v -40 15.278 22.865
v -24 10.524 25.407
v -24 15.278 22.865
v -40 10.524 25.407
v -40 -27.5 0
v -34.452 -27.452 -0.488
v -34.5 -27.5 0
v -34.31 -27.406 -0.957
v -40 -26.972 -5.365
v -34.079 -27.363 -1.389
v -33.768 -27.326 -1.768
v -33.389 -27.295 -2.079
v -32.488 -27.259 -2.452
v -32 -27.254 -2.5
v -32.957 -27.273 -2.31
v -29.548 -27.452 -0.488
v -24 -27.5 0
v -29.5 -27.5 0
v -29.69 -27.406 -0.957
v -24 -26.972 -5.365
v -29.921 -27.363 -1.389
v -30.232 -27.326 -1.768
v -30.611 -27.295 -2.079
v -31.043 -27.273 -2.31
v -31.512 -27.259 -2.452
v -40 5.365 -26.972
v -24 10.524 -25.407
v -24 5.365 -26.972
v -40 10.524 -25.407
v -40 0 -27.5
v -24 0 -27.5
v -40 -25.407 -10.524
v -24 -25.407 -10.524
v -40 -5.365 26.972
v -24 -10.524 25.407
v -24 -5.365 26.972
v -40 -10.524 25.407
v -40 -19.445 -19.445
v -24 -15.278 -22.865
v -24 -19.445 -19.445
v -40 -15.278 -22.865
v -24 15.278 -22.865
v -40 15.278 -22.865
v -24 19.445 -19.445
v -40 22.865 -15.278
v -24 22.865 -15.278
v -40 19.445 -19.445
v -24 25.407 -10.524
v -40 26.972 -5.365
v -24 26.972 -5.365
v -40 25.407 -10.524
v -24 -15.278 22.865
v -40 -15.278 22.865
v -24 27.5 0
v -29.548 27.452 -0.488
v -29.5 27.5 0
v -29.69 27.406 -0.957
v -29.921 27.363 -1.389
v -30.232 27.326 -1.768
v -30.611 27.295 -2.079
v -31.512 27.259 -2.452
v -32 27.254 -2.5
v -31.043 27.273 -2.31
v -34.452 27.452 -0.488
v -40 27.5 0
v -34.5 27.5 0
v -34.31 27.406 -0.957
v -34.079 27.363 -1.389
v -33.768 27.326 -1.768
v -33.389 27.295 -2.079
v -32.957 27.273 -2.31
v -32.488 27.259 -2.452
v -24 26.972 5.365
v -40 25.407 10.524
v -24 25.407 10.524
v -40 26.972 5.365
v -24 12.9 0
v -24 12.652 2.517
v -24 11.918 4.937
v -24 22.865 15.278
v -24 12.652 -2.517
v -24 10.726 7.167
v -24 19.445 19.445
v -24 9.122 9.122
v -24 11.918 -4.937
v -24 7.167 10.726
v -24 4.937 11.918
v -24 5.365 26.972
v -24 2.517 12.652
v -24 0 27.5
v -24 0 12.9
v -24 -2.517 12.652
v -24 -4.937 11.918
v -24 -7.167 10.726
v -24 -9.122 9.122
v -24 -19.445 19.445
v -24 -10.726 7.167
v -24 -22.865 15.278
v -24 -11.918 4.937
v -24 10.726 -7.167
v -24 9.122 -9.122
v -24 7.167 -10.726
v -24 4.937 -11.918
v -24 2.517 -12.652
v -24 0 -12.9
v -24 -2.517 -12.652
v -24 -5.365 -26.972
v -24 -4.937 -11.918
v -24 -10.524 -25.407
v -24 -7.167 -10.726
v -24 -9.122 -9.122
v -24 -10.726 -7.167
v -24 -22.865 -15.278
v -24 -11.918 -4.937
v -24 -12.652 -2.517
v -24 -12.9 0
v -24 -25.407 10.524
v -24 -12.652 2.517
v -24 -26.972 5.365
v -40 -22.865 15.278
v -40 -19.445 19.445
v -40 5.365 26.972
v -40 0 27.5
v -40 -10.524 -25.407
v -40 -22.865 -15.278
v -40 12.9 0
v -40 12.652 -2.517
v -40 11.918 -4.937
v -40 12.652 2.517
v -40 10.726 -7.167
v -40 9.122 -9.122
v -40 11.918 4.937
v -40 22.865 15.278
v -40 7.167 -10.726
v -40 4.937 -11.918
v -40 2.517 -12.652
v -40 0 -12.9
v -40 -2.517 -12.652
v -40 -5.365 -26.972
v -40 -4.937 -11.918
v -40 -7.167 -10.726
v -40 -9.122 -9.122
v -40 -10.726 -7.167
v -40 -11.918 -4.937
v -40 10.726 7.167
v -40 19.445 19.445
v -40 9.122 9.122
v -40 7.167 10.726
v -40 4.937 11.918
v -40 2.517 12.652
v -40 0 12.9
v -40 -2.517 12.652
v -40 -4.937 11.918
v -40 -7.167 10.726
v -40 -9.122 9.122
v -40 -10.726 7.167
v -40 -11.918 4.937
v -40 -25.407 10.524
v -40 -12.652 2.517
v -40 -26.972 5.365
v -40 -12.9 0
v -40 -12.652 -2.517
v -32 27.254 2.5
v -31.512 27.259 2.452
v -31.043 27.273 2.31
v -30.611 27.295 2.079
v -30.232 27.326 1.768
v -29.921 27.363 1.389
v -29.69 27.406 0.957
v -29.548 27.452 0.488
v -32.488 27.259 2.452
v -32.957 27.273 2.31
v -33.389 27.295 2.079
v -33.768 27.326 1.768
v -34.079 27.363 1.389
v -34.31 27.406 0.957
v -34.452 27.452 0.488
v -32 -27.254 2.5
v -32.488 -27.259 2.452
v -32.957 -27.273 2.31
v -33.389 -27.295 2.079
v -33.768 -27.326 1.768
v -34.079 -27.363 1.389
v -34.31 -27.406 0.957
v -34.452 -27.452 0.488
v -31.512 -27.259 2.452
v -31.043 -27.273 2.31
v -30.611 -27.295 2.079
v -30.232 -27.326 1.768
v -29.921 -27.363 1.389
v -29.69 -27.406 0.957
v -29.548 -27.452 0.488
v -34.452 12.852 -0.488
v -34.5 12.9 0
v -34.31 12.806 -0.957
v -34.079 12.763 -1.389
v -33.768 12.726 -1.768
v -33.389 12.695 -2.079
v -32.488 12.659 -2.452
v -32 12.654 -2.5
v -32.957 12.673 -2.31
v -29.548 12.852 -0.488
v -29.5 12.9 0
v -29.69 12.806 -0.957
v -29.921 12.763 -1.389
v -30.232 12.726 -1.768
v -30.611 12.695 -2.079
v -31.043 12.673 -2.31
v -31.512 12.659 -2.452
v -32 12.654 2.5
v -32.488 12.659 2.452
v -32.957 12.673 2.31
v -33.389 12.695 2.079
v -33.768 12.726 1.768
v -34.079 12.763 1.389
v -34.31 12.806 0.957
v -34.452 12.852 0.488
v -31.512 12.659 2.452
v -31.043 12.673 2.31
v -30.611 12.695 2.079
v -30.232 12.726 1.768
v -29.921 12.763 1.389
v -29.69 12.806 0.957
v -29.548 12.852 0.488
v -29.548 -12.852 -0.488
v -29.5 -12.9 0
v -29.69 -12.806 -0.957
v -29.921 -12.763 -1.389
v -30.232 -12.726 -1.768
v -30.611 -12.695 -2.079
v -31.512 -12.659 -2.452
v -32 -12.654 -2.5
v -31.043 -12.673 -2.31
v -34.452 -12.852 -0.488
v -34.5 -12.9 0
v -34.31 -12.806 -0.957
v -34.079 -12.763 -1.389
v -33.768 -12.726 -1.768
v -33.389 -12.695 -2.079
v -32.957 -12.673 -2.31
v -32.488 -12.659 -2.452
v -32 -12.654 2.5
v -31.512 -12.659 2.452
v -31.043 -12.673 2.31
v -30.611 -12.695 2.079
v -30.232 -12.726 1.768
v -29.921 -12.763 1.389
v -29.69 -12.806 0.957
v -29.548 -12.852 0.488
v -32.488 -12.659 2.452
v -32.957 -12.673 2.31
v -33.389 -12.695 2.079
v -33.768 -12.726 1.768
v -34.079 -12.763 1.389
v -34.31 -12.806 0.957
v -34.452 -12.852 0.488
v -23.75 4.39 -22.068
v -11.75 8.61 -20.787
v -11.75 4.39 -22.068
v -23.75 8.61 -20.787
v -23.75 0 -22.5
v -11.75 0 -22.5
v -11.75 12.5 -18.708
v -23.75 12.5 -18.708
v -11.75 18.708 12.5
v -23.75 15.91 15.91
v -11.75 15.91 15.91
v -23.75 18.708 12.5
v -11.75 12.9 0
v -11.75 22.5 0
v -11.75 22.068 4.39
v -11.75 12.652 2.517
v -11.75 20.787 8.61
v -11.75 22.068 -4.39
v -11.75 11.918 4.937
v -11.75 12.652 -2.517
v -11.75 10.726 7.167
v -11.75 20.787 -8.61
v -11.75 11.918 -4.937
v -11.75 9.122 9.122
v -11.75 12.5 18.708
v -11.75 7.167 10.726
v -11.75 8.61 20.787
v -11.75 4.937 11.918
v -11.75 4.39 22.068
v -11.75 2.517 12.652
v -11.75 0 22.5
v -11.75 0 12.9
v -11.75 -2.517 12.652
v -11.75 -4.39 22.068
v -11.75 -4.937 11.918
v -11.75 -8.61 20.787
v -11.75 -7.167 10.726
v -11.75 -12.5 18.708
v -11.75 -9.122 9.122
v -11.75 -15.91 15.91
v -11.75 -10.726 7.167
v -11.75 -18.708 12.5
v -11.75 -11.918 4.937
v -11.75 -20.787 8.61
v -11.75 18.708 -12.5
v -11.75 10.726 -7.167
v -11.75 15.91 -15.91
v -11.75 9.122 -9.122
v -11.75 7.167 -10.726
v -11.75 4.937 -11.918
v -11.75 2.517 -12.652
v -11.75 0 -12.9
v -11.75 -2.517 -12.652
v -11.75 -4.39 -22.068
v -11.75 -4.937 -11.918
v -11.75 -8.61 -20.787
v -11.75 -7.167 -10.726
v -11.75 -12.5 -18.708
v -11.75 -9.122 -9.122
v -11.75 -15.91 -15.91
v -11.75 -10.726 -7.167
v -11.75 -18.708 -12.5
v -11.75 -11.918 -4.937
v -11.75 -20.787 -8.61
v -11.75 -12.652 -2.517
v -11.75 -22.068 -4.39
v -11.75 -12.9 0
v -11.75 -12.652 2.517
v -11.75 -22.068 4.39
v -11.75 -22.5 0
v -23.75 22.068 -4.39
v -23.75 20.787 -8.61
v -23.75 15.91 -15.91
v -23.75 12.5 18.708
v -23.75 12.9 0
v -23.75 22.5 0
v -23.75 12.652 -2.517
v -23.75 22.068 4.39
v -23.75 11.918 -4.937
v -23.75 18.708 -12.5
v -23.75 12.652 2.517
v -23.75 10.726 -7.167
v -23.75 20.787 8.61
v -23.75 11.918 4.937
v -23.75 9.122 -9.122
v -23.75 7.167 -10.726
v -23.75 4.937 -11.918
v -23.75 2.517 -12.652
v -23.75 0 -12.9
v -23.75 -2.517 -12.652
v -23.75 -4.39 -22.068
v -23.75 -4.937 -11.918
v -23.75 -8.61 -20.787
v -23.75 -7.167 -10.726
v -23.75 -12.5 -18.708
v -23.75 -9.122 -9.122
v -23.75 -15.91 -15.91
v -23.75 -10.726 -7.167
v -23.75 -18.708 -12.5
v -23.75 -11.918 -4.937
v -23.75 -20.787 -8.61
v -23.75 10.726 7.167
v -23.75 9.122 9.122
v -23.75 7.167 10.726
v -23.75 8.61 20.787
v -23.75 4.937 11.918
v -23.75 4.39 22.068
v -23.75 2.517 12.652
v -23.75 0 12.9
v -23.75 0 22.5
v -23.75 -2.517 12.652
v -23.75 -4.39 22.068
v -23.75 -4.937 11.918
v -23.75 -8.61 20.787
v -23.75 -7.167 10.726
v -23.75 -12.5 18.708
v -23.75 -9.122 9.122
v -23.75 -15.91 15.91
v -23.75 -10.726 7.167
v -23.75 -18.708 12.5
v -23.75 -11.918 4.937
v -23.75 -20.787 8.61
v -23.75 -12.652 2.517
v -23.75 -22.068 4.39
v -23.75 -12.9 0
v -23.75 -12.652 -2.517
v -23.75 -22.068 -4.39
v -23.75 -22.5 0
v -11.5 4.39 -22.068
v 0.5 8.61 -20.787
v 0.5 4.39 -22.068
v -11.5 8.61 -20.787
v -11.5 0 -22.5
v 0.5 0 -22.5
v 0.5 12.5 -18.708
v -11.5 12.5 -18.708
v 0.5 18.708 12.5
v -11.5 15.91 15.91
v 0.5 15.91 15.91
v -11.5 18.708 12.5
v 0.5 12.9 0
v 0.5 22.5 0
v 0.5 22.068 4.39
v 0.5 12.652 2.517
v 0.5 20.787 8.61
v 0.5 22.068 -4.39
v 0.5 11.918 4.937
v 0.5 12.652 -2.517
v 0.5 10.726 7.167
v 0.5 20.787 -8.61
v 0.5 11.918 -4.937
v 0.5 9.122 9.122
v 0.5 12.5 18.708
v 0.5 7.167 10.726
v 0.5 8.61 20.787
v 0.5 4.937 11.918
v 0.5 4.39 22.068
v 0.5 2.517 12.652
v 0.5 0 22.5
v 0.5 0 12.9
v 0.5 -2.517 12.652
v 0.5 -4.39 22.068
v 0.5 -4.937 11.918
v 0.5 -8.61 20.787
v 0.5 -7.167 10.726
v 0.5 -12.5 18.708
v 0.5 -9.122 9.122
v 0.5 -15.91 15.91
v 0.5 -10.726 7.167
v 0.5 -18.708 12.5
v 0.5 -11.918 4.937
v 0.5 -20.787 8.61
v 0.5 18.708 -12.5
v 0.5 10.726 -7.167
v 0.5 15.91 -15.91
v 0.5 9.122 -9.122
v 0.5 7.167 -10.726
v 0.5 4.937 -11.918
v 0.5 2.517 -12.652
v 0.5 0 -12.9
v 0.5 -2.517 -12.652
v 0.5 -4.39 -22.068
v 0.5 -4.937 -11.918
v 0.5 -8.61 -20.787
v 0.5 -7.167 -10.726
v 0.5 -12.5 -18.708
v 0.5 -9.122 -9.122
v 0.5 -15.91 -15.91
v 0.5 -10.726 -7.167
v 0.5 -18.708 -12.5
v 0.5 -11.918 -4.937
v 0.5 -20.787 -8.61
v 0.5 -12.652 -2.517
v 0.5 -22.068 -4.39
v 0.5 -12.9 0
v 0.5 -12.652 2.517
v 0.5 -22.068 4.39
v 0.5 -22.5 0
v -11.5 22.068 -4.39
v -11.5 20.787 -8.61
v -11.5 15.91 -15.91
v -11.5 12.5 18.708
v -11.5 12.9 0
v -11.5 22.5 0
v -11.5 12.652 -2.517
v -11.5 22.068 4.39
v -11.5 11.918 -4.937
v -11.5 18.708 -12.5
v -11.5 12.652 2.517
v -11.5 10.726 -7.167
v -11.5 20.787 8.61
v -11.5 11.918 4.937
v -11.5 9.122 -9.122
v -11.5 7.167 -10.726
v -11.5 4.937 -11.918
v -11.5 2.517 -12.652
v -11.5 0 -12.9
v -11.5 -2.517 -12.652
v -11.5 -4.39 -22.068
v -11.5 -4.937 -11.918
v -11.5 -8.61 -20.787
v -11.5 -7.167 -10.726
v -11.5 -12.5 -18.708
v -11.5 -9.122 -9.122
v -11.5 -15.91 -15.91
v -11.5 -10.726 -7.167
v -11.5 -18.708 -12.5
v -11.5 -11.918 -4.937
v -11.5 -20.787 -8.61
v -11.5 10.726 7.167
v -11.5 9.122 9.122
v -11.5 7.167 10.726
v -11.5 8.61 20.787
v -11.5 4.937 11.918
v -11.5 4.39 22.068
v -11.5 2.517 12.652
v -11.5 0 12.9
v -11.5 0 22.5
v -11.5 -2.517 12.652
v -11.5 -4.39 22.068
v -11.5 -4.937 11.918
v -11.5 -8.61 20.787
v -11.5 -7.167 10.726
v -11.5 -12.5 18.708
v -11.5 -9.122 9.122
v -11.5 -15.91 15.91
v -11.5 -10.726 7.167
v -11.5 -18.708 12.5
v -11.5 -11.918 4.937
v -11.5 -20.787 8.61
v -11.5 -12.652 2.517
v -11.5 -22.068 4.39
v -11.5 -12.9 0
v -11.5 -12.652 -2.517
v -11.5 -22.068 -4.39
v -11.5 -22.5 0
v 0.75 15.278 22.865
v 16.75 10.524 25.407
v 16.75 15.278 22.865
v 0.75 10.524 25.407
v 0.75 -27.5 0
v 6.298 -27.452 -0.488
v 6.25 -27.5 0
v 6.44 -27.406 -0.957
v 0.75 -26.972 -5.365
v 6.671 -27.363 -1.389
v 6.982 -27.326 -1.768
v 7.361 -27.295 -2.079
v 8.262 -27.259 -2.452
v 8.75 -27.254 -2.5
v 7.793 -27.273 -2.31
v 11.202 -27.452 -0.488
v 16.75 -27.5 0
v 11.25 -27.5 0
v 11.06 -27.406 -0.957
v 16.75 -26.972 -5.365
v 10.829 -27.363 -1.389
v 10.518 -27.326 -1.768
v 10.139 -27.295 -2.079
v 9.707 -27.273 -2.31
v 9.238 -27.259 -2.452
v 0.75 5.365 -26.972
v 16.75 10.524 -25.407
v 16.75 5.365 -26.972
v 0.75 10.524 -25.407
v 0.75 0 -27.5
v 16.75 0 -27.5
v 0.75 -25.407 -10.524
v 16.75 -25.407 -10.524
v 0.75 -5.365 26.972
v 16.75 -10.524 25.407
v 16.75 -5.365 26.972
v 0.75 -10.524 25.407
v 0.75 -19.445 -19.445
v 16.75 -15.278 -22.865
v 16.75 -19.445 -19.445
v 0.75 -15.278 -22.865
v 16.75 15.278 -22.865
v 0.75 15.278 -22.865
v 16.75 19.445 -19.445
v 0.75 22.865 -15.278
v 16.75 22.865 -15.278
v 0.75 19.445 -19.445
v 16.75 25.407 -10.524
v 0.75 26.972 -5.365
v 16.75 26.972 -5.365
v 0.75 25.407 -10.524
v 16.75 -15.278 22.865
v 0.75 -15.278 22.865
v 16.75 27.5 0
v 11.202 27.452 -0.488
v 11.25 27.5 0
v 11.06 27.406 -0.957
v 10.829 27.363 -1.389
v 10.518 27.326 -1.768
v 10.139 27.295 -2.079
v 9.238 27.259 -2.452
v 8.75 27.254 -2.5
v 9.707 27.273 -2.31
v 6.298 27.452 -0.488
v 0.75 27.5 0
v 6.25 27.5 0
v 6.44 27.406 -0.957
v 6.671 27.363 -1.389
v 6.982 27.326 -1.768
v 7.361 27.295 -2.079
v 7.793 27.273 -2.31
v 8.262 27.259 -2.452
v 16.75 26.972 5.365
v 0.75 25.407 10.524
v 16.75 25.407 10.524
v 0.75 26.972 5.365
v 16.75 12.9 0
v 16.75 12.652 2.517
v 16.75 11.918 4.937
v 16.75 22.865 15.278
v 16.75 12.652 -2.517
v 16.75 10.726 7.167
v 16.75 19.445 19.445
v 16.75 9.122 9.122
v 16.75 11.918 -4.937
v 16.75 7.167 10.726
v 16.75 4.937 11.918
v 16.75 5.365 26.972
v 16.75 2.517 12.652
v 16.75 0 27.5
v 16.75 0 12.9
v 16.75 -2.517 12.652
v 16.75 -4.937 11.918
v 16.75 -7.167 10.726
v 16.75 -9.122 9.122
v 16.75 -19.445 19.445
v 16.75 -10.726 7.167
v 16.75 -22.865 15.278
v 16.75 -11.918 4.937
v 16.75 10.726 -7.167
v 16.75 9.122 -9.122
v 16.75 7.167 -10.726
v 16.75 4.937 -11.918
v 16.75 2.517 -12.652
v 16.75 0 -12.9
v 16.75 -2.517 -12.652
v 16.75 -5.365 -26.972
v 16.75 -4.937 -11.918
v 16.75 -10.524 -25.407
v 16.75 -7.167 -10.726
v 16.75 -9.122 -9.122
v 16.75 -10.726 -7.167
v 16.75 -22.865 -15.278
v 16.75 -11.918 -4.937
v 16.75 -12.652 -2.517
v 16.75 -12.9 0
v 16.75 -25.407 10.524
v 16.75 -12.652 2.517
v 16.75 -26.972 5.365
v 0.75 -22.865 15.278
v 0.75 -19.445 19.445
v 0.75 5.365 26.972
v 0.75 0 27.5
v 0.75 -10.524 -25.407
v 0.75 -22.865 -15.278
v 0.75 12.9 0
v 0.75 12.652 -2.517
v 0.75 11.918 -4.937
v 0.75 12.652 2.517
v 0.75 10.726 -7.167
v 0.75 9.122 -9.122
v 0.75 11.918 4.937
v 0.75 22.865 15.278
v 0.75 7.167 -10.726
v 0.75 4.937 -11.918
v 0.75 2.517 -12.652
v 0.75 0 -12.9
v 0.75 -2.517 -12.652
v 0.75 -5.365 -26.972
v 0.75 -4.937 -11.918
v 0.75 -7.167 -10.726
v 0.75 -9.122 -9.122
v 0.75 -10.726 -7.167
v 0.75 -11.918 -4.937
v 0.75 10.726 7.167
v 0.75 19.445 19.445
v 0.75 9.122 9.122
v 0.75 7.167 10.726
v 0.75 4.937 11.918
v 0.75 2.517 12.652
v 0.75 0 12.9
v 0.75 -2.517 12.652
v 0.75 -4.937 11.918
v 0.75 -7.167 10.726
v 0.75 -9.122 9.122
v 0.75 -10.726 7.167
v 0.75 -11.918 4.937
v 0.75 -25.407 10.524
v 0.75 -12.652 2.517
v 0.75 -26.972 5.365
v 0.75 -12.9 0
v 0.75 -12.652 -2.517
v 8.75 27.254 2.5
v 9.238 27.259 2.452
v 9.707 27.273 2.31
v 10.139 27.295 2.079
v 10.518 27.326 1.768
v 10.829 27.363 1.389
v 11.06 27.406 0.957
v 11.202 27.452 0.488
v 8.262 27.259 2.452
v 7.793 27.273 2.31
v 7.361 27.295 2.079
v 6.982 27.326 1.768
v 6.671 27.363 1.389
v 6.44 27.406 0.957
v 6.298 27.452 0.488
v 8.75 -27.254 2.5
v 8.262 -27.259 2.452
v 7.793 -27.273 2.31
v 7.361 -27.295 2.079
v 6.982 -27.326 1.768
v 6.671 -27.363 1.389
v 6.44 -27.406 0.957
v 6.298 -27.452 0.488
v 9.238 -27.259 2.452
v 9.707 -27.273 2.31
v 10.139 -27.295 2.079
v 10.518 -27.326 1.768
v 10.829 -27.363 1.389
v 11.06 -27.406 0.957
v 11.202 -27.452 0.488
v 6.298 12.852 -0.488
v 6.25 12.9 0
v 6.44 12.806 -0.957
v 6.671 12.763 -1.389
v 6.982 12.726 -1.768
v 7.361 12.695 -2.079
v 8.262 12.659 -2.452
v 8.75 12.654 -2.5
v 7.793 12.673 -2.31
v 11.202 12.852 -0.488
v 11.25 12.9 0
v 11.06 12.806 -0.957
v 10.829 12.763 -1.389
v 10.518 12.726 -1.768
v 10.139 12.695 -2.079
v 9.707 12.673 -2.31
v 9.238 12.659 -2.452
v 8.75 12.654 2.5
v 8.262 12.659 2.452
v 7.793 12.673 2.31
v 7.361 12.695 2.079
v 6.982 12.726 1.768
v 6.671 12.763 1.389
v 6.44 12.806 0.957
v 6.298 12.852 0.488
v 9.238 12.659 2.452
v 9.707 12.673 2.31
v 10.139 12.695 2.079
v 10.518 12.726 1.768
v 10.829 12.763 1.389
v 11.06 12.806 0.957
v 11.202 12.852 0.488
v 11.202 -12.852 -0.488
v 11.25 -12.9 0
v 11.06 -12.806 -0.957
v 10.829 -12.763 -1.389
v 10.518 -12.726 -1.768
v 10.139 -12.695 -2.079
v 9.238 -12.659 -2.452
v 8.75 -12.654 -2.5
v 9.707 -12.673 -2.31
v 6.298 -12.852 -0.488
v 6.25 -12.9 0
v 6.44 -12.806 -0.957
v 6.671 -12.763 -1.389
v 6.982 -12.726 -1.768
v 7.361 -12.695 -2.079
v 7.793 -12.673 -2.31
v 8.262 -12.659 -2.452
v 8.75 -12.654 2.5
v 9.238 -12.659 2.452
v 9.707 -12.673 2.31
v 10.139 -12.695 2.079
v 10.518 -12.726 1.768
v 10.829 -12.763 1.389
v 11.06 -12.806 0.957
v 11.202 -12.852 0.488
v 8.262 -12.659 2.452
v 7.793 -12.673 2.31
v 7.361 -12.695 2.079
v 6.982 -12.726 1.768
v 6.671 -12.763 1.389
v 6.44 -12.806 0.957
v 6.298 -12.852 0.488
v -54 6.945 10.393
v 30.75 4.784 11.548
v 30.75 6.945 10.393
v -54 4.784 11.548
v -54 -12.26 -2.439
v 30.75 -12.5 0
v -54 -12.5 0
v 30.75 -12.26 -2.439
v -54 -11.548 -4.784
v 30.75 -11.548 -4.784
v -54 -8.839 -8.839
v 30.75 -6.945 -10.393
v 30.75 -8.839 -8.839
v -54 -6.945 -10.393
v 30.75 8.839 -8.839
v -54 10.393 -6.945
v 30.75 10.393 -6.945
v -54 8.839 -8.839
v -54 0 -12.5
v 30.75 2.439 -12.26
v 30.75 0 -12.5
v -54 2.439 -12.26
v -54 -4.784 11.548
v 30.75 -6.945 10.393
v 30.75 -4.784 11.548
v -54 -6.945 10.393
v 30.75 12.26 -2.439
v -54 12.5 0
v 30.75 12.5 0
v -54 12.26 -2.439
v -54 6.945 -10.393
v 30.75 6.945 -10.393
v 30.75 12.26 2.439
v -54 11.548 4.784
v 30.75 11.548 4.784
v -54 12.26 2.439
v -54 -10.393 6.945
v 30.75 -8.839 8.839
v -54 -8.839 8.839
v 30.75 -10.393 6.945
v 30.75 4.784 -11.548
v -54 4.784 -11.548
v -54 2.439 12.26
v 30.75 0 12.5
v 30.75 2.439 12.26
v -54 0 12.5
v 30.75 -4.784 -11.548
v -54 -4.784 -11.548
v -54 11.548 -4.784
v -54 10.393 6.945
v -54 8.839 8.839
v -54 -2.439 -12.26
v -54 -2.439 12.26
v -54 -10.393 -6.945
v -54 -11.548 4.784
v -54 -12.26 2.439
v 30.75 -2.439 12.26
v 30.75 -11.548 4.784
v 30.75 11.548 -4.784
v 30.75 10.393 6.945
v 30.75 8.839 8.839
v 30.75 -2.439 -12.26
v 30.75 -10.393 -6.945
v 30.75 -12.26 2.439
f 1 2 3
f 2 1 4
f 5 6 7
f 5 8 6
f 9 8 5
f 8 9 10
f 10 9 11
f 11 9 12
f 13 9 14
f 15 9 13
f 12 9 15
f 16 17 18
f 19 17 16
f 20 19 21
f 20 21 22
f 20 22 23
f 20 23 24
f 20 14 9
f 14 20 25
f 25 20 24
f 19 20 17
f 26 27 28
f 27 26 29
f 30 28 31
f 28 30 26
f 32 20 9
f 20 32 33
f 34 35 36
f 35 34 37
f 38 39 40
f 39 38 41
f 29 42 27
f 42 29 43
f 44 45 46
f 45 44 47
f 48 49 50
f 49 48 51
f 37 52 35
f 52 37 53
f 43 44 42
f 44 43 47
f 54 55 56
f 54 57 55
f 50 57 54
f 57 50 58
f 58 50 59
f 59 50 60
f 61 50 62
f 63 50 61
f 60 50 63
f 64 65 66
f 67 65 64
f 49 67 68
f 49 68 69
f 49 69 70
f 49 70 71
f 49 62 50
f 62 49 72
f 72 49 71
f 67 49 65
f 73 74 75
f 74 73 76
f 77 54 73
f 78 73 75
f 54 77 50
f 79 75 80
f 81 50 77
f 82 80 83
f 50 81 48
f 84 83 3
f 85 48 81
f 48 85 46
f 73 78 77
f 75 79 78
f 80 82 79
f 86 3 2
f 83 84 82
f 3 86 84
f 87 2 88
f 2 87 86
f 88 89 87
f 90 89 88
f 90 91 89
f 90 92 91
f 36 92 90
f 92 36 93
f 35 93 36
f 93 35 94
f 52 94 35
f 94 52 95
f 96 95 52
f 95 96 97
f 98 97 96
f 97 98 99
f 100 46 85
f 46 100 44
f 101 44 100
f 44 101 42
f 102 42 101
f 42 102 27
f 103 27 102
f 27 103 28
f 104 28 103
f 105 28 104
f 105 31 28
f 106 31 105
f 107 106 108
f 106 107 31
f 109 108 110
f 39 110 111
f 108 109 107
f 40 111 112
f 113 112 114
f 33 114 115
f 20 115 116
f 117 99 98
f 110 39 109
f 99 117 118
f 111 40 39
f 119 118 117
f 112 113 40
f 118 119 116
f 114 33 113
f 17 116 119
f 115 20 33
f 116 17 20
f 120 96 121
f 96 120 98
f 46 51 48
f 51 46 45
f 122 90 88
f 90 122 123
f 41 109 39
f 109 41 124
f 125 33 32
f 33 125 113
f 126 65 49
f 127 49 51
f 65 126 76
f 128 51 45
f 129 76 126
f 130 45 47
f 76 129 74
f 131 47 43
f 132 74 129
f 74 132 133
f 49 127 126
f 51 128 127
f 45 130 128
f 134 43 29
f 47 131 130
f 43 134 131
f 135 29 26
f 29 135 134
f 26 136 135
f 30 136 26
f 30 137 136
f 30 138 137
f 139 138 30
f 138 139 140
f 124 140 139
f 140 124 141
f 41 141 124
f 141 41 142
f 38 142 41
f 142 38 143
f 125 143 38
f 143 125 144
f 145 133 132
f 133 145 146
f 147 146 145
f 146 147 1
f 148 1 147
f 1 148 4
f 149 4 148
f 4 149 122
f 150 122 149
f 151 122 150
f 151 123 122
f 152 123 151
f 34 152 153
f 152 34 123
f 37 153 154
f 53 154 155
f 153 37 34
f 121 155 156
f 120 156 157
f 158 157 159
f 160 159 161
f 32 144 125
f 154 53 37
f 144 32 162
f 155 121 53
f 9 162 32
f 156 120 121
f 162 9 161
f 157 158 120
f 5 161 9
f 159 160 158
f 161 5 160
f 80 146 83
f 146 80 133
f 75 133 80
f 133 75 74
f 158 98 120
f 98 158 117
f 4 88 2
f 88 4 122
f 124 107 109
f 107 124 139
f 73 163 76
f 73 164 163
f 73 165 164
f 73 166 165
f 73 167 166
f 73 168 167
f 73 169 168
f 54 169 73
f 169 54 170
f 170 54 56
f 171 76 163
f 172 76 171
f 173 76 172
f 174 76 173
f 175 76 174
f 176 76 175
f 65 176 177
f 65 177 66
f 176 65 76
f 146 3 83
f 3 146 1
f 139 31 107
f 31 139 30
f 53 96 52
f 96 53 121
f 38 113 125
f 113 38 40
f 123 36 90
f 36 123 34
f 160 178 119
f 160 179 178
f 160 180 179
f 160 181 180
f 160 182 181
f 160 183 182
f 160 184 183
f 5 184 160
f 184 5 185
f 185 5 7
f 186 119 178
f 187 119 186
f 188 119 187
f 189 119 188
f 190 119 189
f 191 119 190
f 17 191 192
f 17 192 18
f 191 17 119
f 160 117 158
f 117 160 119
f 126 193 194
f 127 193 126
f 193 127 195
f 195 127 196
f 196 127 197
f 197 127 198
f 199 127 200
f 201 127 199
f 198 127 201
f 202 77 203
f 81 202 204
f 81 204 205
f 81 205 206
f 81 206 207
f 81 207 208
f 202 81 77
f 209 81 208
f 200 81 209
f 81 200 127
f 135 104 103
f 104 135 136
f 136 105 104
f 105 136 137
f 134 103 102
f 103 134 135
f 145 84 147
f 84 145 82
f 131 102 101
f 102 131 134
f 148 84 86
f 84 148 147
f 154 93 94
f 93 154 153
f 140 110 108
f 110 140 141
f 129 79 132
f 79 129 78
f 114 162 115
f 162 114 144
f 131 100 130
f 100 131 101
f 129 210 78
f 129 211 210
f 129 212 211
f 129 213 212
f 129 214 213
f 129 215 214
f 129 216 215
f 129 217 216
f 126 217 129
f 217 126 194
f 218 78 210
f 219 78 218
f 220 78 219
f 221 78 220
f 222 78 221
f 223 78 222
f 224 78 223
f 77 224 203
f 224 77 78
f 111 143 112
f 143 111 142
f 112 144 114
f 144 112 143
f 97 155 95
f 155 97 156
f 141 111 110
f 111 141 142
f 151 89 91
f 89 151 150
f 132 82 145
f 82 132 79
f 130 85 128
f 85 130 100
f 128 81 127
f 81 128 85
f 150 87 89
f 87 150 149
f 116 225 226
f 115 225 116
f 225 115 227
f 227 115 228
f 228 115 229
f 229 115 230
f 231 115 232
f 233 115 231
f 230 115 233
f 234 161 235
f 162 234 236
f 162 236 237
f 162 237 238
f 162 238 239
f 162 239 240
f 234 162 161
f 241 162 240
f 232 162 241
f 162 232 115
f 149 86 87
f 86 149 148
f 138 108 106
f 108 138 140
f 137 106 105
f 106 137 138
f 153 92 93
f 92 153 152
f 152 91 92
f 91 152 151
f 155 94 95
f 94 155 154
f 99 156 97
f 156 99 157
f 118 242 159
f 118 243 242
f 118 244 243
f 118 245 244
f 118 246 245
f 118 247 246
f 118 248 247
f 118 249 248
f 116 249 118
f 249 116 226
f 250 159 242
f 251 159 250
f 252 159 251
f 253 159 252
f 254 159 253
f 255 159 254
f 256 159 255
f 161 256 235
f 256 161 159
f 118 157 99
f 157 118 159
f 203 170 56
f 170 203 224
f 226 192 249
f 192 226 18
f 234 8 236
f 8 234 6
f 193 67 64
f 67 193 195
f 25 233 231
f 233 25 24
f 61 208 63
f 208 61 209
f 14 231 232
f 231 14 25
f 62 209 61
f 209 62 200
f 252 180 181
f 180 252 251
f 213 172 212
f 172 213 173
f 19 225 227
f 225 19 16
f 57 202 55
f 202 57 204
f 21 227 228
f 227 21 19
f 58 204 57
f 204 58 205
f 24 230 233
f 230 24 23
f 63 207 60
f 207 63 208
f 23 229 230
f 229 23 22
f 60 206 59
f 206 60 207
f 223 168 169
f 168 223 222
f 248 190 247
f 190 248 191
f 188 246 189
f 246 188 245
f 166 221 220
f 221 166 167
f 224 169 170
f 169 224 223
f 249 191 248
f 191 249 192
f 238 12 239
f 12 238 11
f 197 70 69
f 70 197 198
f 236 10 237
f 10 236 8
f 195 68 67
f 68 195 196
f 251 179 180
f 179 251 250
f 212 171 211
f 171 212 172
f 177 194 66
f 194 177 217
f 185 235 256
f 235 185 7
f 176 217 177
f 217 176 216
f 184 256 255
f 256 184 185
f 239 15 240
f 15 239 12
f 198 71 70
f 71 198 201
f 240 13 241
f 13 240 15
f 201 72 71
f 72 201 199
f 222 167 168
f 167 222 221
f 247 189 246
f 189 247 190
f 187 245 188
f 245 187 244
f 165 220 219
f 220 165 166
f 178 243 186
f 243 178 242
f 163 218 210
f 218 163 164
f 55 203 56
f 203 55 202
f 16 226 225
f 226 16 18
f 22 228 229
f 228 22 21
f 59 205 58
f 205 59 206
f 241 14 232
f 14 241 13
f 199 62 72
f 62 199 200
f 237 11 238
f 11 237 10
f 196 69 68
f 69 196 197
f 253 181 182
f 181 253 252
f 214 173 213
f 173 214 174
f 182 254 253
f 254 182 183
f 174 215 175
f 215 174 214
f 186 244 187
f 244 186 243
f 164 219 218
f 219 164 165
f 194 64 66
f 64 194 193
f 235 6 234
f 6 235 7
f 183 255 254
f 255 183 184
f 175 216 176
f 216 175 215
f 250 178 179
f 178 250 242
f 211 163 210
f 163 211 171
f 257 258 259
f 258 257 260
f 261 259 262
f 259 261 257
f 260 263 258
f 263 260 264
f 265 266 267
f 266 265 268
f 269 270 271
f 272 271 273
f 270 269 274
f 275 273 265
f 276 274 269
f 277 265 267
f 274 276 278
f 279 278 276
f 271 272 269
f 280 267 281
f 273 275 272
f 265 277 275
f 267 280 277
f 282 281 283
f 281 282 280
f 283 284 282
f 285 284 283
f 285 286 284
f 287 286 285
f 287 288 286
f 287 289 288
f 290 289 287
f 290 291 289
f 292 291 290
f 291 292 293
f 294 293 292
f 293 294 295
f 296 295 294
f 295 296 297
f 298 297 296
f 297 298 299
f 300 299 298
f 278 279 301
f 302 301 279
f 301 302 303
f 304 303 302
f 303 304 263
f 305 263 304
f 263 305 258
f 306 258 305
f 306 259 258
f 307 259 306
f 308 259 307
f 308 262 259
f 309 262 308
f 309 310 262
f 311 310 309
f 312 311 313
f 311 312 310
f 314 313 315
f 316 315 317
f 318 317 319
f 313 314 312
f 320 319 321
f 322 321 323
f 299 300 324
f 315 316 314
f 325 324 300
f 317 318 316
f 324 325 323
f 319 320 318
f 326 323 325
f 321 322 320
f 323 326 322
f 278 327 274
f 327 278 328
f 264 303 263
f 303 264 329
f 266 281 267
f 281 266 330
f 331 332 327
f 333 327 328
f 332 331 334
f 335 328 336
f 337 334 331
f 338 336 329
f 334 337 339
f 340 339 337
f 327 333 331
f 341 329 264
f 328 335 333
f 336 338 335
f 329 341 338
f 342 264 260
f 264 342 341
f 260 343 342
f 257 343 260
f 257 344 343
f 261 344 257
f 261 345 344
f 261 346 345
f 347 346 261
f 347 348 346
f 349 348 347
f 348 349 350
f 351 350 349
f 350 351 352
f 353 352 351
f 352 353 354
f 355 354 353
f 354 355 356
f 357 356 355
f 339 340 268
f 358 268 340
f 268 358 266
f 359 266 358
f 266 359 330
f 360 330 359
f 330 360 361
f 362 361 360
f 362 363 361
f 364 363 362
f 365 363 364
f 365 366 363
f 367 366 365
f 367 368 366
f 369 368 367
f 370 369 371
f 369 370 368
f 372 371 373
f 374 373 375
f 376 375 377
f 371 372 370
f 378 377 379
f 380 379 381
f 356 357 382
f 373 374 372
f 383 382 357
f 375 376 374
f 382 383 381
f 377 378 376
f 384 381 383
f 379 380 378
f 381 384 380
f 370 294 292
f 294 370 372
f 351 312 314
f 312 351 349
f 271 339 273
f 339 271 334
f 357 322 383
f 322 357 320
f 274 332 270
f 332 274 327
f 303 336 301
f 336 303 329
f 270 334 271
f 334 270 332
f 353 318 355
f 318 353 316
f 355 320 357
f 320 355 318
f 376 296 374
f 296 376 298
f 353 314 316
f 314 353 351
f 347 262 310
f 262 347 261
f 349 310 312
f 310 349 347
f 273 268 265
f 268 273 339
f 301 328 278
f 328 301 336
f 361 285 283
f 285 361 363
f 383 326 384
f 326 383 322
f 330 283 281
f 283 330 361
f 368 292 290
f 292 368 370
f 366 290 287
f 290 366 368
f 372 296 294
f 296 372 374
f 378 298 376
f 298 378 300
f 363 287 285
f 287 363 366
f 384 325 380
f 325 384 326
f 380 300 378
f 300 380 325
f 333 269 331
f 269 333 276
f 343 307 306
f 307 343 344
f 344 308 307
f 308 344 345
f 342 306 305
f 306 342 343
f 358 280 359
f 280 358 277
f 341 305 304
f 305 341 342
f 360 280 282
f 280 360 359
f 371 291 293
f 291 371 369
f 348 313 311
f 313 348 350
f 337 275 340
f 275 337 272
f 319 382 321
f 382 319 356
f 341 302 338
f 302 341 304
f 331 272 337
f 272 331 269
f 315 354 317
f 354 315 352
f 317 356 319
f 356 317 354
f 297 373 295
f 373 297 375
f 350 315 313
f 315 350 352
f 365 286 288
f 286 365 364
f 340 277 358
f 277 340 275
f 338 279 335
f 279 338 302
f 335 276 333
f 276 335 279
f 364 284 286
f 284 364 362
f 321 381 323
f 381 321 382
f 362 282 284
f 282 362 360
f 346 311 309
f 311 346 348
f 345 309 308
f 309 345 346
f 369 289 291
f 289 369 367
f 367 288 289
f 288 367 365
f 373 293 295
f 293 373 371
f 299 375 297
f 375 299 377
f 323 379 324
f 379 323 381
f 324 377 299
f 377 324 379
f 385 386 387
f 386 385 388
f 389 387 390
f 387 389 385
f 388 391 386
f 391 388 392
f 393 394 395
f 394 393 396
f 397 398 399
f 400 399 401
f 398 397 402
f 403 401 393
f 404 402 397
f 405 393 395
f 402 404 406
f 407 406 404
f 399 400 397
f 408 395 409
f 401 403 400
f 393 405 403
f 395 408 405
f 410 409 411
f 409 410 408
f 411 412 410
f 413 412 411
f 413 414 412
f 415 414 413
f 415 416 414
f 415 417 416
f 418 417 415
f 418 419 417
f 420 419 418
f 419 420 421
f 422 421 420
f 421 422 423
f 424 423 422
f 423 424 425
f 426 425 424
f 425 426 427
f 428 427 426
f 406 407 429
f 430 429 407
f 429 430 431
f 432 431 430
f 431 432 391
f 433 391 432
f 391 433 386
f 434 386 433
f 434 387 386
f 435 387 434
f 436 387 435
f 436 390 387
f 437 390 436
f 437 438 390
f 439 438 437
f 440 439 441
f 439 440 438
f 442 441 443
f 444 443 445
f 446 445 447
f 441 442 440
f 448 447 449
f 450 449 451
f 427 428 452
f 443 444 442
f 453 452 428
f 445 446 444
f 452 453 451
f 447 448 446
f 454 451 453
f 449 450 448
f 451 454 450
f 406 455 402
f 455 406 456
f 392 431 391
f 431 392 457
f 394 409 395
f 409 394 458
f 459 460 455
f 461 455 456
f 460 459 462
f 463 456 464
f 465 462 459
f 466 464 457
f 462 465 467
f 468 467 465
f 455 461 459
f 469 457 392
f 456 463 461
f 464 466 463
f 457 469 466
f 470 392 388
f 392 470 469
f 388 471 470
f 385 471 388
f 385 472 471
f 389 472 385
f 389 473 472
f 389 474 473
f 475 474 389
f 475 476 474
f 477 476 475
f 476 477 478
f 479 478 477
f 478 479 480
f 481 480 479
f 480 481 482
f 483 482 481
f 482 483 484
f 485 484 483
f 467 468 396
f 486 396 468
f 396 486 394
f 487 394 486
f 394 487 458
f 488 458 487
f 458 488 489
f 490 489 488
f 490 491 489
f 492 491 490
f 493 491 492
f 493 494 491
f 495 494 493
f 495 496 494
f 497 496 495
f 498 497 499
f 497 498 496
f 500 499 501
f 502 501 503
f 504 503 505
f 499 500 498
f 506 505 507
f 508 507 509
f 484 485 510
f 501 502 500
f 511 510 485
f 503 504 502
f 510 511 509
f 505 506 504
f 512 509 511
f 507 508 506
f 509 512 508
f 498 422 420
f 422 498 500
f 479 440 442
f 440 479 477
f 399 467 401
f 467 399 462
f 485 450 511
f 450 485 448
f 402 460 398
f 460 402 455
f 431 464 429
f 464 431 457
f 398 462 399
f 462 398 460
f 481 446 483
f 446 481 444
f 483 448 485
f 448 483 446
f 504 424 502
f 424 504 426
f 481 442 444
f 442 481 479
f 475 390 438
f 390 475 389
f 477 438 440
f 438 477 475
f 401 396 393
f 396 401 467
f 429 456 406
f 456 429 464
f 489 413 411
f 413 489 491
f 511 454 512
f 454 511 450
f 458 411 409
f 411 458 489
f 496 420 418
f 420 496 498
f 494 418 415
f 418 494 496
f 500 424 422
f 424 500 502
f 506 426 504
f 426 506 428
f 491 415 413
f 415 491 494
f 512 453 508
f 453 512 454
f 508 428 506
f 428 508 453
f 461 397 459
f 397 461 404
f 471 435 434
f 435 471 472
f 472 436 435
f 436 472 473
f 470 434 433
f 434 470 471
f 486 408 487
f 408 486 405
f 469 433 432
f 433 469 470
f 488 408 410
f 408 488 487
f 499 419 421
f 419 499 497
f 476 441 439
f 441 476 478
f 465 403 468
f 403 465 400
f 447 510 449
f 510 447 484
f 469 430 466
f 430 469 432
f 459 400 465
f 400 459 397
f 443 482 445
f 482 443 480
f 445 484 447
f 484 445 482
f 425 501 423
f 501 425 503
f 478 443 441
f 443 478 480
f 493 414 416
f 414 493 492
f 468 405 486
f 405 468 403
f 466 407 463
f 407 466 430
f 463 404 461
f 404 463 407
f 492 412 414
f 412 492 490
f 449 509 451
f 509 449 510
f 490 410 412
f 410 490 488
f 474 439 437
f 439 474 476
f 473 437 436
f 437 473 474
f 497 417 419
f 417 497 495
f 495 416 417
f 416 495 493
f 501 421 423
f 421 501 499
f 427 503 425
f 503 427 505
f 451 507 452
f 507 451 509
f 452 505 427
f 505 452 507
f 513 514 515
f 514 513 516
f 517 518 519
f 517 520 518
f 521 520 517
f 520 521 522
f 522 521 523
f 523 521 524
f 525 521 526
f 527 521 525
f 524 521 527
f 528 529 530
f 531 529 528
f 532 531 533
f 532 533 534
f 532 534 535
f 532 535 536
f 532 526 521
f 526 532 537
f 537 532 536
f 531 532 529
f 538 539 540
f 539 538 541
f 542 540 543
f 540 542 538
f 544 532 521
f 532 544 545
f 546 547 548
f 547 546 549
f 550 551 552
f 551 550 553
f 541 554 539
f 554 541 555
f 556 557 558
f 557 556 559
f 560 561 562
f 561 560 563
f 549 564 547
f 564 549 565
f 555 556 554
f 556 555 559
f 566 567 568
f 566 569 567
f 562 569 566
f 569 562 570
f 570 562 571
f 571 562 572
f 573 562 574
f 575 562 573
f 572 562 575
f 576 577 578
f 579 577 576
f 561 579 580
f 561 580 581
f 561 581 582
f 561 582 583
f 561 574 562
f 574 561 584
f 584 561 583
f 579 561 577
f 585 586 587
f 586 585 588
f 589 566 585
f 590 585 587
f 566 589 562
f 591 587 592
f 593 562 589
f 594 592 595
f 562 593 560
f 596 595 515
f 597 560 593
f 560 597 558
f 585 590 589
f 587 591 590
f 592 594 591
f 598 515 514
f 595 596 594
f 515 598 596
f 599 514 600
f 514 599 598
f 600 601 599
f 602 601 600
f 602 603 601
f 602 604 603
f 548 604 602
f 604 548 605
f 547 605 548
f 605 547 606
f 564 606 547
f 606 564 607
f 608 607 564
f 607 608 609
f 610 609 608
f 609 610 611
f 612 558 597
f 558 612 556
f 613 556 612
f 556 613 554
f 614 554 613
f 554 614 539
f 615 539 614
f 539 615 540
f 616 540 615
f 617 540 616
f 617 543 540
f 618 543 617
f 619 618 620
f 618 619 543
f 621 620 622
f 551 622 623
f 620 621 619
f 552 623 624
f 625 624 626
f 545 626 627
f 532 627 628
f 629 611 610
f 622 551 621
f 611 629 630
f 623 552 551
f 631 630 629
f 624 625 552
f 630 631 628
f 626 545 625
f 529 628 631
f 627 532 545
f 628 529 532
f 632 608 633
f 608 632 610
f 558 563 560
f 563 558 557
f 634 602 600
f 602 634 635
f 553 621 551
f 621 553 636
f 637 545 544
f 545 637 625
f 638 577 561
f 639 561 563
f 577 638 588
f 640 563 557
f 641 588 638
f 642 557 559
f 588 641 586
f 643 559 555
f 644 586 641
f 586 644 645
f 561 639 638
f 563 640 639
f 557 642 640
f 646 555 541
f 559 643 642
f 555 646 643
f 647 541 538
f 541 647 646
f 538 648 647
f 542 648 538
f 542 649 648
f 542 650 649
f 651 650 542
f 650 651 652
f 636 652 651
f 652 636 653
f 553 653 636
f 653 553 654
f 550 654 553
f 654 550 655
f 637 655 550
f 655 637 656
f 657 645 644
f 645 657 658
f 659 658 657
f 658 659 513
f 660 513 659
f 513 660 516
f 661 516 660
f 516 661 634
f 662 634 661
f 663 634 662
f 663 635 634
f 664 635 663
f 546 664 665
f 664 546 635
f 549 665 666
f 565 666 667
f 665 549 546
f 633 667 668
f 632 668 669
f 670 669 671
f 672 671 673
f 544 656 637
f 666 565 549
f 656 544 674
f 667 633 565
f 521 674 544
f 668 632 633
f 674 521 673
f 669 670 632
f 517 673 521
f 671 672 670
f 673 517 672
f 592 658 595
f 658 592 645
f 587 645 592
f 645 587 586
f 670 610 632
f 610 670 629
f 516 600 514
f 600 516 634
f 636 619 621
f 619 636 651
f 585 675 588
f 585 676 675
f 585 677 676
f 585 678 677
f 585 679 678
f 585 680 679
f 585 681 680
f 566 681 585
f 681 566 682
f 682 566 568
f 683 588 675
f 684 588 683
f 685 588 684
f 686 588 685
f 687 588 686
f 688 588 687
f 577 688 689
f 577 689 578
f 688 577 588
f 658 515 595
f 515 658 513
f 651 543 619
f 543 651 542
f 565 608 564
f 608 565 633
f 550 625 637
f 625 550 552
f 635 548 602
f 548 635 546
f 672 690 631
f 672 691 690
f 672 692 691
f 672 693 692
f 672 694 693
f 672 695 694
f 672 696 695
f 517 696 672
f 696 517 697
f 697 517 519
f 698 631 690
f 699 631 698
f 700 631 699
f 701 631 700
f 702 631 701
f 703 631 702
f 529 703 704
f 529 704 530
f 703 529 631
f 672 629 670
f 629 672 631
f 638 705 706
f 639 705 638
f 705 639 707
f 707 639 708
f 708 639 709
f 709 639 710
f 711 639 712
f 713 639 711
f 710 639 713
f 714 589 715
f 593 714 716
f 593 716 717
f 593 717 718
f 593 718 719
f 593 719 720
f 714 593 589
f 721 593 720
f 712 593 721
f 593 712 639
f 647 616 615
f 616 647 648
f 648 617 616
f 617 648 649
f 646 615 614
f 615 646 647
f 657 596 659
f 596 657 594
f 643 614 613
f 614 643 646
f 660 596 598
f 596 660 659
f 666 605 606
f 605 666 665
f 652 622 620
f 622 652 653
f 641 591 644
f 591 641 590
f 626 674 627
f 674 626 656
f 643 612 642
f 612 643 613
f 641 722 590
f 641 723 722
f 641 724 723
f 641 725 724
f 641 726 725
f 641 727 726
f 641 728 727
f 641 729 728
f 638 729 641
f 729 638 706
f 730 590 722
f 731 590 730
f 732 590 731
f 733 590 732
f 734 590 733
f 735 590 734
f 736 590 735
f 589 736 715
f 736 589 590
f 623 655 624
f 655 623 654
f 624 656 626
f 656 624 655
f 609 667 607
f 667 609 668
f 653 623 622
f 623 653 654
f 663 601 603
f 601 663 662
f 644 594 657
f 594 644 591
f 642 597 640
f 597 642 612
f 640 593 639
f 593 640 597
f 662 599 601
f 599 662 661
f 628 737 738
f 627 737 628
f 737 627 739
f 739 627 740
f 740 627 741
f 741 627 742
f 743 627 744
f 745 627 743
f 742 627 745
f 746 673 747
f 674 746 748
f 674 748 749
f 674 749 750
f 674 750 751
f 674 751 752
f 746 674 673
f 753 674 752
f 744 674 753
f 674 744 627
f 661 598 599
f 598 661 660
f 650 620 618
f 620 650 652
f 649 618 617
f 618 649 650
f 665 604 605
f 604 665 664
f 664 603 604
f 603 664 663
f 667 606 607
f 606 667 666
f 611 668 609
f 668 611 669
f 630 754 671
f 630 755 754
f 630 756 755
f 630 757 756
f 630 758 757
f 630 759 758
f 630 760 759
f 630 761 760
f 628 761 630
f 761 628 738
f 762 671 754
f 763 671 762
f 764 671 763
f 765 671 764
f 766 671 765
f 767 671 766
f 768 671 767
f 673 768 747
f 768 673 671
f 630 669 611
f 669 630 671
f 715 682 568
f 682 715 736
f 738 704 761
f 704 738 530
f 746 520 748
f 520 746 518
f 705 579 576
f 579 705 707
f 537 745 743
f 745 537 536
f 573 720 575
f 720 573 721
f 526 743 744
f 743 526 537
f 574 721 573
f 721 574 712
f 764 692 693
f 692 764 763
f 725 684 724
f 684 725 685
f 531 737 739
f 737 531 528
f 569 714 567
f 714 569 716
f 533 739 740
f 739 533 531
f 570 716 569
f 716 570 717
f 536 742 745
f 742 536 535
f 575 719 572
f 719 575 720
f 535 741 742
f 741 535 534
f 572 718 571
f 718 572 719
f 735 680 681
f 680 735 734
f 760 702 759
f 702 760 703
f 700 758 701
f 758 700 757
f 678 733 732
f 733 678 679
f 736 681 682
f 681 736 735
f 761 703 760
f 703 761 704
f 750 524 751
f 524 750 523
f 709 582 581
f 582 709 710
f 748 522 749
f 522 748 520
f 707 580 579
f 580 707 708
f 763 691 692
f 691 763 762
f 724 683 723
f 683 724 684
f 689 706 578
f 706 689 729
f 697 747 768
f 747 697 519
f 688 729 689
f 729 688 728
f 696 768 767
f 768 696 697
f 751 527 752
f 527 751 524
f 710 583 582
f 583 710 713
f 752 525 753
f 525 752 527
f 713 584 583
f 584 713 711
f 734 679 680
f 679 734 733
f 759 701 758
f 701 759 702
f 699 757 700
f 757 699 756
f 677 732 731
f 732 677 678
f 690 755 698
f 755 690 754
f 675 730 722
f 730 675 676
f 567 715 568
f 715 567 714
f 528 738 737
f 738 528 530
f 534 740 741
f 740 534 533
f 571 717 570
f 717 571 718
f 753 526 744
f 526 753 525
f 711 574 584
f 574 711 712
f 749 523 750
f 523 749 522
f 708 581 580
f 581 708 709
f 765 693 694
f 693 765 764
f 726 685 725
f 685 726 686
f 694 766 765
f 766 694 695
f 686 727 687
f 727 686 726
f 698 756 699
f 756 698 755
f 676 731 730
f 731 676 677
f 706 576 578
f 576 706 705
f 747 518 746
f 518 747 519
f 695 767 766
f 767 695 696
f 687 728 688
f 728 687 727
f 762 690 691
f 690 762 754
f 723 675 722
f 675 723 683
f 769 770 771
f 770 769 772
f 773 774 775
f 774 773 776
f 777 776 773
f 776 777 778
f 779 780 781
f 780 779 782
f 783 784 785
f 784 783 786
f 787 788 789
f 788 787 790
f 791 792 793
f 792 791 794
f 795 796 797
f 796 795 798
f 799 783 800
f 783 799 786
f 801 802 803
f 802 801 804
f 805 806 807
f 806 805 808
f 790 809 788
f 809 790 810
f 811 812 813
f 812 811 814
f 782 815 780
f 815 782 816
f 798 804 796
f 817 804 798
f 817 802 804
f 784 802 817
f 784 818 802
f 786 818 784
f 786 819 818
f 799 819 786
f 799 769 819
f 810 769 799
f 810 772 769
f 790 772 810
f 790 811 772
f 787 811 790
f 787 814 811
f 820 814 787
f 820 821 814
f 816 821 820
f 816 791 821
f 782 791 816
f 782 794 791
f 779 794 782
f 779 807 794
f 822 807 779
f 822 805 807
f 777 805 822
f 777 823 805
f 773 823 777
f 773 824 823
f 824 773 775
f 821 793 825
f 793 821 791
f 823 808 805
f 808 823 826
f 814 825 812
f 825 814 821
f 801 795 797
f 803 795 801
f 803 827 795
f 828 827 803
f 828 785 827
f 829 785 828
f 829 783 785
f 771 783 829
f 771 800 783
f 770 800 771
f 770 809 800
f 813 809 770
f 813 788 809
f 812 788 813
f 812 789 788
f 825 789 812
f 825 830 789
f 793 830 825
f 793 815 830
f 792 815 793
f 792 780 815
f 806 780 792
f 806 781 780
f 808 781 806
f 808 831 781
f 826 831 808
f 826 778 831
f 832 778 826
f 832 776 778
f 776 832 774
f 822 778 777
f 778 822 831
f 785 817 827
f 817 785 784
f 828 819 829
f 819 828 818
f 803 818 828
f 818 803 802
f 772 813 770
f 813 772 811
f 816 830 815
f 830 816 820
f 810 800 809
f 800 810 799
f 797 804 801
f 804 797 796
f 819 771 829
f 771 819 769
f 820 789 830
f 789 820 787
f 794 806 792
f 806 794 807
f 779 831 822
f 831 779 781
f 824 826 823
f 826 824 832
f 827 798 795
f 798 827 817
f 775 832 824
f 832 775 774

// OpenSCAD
$fn = 32;

// ------------------------------------------------------------------------
// Shaft with rings and collars: d25 shaft, 4 rings
// Every part is its own module, assembly() places them once.
// ------------------------------------------------------------------------

// --- part 1 ---
module shaft() {
  translate([0, 0, -42.375]) cylinder(h = 84.75, d = 25);
}

// --- part 2 ---
module collar_a() {
  difference() {
    cylinder(h = 16, d = 55);
    translate([0, 0, -1]) cylinder(h = 18, d = 25.8);
    translate([0, 0, 8]) rotate([90, 0, 0]) cylinder(h = 57, d = 5, center = true);
  }
}

// --- part 3 ---
module spacer_a() {
  difference() {
      translate([0, 0, 0]) cylinder(h = 12, d = 45);
      translate([0, 0, -1]) cylinder(h = 14, d = 25.8);
    }
}

// --- part 4 ---
module spacer_b() {
  difference() {
      translate([0, 0, 0]) cylinder(h = 12, d = 45);
      translate([0, 0, -1]) cylinder(h = 14, d = 25.8);
    }
}

// --- part 5 ---
module collar_b() {
  difference() {
    cylinder(h = 16, d = 55);
    translate([0, 0, -1]) cylinder(h = 18, d = 25.8);
    translate([0, 0, 8]) rotate([90, 0, 0]) cylinder(h = 57, d = 5, center = true);
  }
}

// --- assembly ---
module assembly() {
  translate([-11.625, 0, 0]) rotate([0, 90, 0]) shaft();
  translate([-40, 0, 0]) rotate([0, 90, 0]) collar_a();
  translate([-23.75, 0, 0]) rotate([0, 90, 0]) spacer_a();
  translate([-11.5, 0, 0]) rotate([0, 90, 0]) spacer_b();
  translate([0.75, 0, 0]) rotate([0, 90, 0]) collar_b();
}

assembly();
